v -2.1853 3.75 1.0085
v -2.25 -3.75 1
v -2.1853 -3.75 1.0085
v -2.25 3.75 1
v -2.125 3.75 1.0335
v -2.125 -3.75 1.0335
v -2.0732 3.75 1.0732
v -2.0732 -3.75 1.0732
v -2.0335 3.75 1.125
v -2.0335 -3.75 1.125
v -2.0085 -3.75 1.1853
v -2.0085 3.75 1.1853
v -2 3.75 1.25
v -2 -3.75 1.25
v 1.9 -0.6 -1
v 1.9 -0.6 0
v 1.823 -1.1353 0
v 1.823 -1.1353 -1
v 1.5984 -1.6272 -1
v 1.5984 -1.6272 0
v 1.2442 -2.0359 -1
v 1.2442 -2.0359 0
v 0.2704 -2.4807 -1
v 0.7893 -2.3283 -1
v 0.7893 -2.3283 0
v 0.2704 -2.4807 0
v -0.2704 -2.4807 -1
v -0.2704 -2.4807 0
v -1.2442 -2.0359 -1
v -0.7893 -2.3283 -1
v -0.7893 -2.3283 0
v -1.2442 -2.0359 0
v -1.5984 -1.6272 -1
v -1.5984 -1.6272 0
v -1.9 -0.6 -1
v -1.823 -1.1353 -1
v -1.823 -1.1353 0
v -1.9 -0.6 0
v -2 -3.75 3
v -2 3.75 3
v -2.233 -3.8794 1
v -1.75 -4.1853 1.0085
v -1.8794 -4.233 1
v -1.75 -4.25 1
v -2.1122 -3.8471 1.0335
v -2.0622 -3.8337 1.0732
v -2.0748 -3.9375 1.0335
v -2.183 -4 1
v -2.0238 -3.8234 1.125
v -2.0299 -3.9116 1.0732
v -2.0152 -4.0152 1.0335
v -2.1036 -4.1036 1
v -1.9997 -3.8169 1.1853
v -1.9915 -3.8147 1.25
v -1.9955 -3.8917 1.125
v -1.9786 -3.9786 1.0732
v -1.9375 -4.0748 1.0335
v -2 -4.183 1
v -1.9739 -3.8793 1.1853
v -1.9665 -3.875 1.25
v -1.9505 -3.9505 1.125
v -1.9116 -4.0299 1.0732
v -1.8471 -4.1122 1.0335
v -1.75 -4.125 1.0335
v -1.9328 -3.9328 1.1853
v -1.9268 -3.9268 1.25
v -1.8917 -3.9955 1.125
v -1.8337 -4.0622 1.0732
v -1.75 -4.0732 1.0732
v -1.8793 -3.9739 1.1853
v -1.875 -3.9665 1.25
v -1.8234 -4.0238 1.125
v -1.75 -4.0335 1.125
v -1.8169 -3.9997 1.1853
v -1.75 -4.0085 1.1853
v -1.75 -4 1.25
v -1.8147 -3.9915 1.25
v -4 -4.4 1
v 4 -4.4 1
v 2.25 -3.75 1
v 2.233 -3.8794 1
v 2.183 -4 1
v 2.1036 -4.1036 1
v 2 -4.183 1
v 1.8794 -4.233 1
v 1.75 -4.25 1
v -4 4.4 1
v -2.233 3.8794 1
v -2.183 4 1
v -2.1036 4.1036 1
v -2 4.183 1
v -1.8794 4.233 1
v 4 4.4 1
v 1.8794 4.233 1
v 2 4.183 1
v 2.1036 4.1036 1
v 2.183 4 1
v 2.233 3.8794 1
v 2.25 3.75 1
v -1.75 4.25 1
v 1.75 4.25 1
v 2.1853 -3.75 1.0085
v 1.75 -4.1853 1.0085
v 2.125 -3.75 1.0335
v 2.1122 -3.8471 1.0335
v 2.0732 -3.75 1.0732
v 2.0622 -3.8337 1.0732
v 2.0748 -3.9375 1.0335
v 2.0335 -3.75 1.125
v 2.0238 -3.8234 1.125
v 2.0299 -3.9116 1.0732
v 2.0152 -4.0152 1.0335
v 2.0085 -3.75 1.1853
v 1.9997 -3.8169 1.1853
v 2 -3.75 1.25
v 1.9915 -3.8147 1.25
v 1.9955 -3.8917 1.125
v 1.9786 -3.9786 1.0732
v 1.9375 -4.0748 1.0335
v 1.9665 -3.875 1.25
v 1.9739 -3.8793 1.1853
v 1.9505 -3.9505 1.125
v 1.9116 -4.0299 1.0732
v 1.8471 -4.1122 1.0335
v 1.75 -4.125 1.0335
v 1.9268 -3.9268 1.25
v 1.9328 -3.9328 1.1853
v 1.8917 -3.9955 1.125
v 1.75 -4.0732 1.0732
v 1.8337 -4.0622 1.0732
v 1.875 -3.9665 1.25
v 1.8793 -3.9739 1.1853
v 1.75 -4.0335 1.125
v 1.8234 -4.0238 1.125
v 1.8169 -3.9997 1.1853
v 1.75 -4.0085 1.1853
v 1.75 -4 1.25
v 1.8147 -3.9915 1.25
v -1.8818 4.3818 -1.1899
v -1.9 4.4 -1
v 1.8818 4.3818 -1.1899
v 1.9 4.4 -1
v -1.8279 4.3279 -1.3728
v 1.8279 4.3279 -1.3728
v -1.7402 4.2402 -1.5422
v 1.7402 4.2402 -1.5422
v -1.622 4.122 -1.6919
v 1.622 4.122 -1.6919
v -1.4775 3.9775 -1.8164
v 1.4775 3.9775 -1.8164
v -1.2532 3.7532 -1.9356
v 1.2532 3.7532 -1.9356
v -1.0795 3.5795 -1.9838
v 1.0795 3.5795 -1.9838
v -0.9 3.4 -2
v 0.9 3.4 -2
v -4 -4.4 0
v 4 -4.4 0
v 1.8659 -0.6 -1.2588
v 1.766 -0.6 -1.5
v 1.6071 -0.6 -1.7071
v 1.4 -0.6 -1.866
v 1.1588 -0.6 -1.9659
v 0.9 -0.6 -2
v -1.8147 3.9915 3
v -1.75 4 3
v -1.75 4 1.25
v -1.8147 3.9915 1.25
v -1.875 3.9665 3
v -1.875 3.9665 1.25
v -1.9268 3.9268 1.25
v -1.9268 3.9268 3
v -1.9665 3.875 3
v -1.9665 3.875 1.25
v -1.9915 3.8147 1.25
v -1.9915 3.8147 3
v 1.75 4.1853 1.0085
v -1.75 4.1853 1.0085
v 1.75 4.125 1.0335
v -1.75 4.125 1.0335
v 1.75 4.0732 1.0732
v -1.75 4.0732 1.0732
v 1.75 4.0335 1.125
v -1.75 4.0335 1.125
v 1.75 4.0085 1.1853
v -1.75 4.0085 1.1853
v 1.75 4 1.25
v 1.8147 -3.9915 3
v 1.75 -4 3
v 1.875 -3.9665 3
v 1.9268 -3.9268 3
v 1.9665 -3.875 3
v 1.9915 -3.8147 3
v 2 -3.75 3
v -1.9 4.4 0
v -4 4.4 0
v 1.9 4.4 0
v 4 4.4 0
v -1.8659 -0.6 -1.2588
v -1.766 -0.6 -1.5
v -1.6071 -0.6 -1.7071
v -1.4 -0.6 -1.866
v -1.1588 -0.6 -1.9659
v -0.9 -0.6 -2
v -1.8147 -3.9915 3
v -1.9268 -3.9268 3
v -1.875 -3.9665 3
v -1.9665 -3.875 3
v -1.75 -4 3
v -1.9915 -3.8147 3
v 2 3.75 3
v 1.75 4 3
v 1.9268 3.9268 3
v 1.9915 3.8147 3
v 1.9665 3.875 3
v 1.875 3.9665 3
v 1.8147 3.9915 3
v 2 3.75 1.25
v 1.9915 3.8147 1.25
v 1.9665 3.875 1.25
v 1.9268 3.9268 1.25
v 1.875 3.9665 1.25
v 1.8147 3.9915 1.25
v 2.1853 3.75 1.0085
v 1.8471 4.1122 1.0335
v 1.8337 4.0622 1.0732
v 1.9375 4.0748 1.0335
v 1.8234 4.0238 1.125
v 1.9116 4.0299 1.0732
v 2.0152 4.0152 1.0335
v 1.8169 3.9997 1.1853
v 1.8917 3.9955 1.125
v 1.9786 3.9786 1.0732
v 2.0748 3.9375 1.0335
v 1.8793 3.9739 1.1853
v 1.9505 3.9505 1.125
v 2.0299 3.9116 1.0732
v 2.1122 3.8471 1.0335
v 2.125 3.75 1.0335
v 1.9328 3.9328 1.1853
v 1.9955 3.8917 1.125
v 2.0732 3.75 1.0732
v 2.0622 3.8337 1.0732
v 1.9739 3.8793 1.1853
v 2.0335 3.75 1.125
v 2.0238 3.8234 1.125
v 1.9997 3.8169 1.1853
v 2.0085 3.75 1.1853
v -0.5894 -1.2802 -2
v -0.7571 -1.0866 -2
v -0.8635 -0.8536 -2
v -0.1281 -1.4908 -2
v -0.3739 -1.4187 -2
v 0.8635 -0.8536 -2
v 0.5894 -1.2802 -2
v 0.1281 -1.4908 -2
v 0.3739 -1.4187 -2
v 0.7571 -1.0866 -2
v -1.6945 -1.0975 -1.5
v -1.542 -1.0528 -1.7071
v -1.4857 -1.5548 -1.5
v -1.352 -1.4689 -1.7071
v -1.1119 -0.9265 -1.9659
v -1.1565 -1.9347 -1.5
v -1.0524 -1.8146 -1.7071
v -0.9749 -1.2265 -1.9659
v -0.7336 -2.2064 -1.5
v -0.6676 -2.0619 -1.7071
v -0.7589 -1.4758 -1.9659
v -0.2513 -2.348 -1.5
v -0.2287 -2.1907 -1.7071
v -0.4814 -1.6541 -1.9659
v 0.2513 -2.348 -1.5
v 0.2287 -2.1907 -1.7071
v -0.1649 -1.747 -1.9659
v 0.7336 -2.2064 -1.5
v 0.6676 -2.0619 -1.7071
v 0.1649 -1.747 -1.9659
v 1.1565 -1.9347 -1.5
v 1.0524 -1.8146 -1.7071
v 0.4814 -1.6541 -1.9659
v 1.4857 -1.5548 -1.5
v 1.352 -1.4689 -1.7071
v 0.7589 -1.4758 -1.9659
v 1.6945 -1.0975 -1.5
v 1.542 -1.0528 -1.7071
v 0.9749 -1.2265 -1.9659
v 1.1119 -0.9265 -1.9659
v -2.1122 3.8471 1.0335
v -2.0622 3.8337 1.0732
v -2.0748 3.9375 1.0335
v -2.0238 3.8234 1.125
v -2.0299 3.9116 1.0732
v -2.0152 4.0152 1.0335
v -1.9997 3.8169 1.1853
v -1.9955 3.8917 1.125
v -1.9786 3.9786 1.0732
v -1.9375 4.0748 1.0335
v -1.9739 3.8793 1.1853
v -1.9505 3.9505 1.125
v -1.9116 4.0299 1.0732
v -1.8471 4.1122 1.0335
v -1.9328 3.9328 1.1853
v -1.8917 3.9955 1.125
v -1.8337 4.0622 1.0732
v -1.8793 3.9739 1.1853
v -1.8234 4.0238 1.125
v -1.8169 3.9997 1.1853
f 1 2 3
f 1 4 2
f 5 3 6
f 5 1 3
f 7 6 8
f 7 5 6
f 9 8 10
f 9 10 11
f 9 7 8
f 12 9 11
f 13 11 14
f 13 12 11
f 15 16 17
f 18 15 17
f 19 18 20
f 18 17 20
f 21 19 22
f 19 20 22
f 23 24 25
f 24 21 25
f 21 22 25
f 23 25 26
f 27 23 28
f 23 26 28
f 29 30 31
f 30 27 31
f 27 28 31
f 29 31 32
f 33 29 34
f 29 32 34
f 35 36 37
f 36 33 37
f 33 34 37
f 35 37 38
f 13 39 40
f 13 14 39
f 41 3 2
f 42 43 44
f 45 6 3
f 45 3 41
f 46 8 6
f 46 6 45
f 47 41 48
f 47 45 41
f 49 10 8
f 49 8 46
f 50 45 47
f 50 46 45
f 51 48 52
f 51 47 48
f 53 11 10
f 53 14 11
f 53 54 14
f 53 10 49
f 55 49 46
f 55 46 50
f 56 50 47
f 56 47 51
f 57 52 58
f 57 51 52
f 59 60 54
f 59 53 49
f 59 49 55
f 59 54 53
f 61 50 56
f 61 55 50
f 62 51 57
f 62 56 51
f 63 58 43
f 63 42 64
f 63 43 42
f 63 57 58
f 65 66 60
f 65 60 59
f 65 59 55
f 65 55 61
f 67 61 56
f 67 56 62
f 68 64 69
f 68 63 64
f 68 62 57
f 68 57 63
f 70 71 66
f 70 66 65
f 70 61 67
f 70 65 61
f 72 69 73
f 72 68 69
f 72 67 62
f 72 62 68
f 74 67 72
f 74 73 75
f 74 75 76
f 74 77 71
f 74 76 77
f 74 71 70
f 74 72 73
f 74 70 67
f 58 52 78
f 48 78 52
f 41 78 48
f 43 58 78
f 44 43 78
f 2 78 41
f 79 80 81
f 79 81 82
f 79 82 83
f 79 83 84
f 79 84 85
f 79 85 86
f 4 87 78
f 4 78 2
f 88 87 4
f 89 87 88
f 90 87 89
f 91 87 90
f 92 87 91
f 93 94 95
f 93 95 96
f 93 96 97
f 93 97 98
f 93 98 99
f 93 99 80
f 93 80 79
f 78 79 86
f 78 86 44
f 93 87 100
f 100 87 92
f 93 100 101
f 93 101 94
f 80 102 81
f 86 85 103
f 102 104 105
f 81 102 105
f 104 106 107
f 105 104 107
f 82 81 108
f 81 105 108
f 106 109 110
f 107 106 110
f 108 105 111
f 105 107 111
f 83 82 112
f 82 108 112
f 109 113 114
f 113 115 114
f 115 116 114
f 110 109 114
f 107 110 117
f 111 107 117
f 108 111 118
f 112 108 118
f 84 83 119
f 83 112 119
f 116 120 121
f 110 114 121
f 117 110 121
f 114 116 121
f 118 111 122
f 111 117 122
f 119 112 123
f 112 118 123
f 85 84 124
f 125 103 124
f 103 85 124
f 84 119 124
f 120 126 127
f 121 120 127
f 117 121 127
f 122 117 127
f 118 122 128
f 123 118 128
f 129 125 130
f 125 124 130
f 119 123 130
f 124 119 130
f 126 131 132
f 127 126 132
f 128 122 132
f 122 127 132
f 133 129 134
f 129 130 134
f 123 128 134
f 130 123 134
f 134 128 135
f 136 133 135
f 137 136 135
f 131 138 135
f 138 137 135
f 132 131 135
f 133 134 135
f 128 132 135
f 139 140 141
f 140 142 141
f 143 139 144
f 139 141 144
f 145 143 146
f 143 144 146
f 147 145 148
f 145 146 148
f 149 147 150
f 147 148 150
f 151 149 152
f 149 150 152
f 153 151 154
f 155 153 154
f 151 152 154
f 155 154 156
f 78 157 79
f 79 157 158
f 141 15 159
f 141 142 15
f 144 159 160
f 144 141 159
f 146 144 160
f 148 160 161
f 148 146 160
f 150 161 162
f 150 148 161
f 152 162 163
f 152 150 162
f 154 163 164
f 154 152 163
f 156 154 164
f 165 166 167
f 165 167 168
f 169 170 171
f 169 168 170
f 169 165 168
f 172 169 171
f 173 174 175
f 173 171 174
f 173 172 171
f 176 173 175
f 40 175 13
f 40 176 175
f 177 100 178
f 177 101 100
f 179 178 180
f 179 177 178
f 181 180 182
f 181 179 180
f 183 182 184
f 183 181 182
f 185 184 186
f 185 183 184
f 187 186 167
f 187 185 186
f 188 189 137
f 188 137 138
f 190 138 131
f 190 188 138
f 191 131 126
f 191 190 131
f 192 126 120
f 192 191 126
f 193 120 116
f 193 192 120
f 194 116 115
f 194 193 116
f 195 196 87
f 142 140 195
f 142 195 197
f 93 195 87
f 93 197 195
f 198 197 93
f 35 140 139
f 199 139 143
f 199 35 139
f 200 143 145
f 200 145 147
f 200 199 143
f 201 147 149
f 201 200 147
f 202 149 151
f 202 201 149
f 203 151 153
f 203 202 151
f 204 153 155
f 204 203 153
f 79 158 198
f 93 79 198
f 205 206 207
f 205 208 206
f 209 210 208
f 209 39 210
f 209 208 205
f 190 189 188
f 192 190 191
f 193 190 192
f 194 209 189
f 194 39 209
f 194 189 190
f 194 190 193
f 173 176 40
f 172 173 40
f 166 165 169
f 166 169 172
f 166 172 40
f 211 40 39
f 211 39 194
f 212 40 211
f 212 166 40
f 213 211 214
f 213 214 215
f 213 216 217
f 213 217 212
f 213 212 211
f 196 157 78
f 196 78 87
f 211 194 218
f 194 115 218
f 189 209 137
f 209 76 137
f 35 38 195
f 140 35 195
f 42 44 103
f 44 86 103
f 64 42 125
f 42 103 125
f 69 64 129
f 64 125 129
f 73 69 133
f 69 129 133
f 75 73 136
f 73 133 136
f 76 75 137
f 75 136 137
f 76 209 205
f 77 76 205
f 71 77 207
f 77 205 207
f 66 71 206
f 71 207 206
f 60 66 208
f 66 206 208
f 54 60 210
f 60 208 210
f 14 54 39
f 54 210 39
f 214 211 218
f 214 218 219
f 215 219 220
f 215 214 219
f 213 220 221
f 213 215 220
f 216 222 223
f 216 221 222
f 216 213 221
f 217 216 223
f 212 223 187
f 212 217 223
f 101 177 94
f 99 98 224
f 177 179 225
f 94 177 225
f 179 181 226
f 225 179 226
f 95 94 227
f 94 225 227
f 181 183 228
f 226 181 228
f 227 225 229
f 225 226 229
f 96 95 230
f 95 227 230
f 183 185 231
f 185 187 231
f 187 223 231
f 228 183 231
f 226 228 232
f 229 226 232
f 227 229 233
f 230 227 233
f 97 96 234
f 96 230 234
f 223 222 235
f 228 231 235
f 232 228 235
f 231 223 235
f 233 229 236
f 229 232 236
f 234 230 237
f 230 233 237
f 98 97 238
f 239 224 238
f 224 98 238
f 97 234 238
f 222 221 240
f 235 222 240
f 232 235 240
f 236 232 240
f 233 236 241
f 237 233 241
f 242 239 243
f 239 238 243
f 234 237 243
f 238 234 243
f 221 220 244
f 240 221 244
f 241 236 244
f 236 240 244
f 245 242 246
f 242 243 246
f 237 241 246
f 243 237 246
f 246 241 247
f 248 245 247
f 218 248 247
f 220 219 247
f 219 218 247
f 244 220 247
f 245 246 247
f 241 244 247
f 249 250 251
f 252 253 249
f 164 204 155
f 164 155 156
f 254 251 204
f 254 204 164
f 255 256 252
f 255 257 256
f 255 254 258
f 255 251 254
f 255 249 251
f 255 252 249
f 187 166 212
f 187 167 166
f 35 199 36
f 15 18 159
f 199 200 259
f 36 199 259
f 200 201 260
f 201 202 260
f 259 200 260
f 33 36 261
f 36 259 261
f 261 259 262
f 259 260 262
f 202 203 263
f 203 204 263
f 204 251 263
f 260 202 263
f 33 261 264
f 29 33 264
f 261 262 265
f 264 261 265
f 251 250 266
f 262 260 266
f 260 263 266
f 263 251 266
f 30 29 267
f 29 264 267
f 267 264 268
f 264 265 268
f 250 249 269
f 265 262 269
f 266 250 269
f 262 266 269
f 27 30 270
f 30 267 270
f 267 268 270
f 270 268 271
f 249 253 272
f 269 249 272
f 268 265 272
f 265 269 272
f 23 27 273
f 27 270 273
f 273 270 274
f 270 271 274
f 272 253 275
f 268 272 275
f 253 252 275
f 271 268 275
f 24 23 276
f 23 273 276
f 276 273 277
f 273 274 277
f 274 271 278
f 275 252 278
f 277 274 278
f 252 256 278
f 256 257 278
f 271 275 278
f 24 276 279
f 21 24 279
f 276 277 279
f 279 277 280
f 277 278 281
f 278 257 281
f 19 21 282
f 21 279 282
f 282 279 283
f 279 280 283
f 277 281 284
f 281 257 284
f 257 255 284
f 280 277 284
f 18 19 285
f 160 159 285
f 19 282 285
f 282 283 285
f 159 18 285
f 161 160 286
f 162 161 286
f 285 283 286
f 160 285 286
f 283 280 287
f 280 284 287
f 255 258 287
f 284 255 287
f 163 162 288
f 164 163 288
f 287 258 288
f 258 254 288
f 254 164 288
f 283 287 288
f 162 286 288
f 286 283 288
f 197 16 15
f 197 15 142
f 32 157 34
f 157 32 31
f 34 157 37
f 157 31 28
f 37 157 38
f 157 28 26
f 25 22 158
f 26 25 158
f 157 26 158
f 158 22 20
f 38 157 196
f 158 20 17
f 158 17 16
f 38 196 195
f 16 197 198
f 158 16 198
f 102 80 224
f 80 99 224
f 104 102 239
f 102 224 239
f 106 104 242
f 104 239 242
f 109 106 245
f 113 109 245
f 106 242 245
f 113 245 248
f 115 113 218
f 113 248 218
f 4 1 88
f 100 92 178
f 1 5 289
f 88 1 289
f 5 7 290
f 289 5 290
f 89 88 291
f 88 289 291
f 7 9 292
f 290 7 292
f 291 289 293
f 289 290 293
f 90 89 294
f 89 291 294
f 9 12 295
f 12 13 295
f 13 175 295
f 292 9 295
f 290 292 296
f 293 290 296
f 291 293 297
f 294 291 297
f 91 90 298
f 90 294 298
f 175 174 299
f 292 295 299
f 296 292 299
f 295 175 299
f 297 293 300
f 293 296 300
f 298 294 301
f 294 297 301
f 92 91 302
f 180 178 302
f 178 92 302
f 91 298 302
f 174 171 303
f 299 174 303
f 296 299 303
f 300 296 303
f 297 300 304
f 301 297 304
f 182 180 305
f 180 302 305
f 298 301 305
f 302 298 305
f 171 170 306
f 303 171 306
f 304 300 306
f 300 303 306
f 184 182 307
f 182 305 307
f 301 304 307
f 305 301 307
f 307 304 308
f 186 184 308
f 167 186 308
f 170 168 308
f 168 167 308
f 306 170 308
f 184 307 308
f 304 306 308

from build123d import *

# Parameters (mm, degrees)
SKETCH030_W  = 8
SKETCH030_H  = 8.8
PAD008_DEPTH = 1
PAD009_DEPTH = 2
FILLET015_R  = 1
SKETCH032_W  = 4
SKETCH032_H  = 8
PAD010_DEPTH = 2
FILLET016_R  = 0.25


with BuildPart() as part:
    # Sketch030 → Pad008 (new body)
    with BuildSketch(Plane.XY):
        Rectangle(SKETCH030_W, SKETCH030_H)
    extrude(amount=PAD008_DEPTH)

    # Sketch031 (on Face5 of Pad008) → Pad009 (join)
    with BuildSketch(Plane(origin=(0, 0, 0), x_dir=(1, 0, 0), z_dir=(0, 0, -1))):
        with BuildLine():
            ThreePointArc((1.9, 0.6), (0, 2.5), (-1.9, 0.6))
            Line((-1.9, 0.6), (-1.9, -4.4))
            Line((-1.9, -4.4), (1.9, -4.4))
            Line((1.9, 0.6), (1.9, -4.4))
        make_face()
    extrude(amount=PAD009_DEPTH)

    # Fillet015
    fillet015_edges = [part.edges().sort_by_distance(p)[0] for p in [
        (1.9, 1.9, -2),
        (0, -2.5, -2),
        (-1.9, 1.9, -2),
        (0, 4.4, -2),
    ]]
    fillet(fillet015_edges, radius=FILLET015_R)

    # Sketch032 (on Face6 of Pad008) → Pad010 (join)
    with BuildSketch(Plane.XY.offset(1)):
        Rectangle(SKETCH032_W, SKETCH032_H)
    extrude(amount=PAD010_DEPTH)

    # Fillet016
    fillet016_edges = [part.edges().sort_by_distance(p)[0] for p in [
        (-2, 4, 2),
        (2, 4, 2),
        (2, -4, 2),
        (-2, -4, 2),
        (-2, 0, 1),
        (0, 4, 1),
        (2, 0, 1),
        (0, -4, 1),
    ]]
    fillet(fillet016_edges, radius=FILLET016_R)


solid = part.part
